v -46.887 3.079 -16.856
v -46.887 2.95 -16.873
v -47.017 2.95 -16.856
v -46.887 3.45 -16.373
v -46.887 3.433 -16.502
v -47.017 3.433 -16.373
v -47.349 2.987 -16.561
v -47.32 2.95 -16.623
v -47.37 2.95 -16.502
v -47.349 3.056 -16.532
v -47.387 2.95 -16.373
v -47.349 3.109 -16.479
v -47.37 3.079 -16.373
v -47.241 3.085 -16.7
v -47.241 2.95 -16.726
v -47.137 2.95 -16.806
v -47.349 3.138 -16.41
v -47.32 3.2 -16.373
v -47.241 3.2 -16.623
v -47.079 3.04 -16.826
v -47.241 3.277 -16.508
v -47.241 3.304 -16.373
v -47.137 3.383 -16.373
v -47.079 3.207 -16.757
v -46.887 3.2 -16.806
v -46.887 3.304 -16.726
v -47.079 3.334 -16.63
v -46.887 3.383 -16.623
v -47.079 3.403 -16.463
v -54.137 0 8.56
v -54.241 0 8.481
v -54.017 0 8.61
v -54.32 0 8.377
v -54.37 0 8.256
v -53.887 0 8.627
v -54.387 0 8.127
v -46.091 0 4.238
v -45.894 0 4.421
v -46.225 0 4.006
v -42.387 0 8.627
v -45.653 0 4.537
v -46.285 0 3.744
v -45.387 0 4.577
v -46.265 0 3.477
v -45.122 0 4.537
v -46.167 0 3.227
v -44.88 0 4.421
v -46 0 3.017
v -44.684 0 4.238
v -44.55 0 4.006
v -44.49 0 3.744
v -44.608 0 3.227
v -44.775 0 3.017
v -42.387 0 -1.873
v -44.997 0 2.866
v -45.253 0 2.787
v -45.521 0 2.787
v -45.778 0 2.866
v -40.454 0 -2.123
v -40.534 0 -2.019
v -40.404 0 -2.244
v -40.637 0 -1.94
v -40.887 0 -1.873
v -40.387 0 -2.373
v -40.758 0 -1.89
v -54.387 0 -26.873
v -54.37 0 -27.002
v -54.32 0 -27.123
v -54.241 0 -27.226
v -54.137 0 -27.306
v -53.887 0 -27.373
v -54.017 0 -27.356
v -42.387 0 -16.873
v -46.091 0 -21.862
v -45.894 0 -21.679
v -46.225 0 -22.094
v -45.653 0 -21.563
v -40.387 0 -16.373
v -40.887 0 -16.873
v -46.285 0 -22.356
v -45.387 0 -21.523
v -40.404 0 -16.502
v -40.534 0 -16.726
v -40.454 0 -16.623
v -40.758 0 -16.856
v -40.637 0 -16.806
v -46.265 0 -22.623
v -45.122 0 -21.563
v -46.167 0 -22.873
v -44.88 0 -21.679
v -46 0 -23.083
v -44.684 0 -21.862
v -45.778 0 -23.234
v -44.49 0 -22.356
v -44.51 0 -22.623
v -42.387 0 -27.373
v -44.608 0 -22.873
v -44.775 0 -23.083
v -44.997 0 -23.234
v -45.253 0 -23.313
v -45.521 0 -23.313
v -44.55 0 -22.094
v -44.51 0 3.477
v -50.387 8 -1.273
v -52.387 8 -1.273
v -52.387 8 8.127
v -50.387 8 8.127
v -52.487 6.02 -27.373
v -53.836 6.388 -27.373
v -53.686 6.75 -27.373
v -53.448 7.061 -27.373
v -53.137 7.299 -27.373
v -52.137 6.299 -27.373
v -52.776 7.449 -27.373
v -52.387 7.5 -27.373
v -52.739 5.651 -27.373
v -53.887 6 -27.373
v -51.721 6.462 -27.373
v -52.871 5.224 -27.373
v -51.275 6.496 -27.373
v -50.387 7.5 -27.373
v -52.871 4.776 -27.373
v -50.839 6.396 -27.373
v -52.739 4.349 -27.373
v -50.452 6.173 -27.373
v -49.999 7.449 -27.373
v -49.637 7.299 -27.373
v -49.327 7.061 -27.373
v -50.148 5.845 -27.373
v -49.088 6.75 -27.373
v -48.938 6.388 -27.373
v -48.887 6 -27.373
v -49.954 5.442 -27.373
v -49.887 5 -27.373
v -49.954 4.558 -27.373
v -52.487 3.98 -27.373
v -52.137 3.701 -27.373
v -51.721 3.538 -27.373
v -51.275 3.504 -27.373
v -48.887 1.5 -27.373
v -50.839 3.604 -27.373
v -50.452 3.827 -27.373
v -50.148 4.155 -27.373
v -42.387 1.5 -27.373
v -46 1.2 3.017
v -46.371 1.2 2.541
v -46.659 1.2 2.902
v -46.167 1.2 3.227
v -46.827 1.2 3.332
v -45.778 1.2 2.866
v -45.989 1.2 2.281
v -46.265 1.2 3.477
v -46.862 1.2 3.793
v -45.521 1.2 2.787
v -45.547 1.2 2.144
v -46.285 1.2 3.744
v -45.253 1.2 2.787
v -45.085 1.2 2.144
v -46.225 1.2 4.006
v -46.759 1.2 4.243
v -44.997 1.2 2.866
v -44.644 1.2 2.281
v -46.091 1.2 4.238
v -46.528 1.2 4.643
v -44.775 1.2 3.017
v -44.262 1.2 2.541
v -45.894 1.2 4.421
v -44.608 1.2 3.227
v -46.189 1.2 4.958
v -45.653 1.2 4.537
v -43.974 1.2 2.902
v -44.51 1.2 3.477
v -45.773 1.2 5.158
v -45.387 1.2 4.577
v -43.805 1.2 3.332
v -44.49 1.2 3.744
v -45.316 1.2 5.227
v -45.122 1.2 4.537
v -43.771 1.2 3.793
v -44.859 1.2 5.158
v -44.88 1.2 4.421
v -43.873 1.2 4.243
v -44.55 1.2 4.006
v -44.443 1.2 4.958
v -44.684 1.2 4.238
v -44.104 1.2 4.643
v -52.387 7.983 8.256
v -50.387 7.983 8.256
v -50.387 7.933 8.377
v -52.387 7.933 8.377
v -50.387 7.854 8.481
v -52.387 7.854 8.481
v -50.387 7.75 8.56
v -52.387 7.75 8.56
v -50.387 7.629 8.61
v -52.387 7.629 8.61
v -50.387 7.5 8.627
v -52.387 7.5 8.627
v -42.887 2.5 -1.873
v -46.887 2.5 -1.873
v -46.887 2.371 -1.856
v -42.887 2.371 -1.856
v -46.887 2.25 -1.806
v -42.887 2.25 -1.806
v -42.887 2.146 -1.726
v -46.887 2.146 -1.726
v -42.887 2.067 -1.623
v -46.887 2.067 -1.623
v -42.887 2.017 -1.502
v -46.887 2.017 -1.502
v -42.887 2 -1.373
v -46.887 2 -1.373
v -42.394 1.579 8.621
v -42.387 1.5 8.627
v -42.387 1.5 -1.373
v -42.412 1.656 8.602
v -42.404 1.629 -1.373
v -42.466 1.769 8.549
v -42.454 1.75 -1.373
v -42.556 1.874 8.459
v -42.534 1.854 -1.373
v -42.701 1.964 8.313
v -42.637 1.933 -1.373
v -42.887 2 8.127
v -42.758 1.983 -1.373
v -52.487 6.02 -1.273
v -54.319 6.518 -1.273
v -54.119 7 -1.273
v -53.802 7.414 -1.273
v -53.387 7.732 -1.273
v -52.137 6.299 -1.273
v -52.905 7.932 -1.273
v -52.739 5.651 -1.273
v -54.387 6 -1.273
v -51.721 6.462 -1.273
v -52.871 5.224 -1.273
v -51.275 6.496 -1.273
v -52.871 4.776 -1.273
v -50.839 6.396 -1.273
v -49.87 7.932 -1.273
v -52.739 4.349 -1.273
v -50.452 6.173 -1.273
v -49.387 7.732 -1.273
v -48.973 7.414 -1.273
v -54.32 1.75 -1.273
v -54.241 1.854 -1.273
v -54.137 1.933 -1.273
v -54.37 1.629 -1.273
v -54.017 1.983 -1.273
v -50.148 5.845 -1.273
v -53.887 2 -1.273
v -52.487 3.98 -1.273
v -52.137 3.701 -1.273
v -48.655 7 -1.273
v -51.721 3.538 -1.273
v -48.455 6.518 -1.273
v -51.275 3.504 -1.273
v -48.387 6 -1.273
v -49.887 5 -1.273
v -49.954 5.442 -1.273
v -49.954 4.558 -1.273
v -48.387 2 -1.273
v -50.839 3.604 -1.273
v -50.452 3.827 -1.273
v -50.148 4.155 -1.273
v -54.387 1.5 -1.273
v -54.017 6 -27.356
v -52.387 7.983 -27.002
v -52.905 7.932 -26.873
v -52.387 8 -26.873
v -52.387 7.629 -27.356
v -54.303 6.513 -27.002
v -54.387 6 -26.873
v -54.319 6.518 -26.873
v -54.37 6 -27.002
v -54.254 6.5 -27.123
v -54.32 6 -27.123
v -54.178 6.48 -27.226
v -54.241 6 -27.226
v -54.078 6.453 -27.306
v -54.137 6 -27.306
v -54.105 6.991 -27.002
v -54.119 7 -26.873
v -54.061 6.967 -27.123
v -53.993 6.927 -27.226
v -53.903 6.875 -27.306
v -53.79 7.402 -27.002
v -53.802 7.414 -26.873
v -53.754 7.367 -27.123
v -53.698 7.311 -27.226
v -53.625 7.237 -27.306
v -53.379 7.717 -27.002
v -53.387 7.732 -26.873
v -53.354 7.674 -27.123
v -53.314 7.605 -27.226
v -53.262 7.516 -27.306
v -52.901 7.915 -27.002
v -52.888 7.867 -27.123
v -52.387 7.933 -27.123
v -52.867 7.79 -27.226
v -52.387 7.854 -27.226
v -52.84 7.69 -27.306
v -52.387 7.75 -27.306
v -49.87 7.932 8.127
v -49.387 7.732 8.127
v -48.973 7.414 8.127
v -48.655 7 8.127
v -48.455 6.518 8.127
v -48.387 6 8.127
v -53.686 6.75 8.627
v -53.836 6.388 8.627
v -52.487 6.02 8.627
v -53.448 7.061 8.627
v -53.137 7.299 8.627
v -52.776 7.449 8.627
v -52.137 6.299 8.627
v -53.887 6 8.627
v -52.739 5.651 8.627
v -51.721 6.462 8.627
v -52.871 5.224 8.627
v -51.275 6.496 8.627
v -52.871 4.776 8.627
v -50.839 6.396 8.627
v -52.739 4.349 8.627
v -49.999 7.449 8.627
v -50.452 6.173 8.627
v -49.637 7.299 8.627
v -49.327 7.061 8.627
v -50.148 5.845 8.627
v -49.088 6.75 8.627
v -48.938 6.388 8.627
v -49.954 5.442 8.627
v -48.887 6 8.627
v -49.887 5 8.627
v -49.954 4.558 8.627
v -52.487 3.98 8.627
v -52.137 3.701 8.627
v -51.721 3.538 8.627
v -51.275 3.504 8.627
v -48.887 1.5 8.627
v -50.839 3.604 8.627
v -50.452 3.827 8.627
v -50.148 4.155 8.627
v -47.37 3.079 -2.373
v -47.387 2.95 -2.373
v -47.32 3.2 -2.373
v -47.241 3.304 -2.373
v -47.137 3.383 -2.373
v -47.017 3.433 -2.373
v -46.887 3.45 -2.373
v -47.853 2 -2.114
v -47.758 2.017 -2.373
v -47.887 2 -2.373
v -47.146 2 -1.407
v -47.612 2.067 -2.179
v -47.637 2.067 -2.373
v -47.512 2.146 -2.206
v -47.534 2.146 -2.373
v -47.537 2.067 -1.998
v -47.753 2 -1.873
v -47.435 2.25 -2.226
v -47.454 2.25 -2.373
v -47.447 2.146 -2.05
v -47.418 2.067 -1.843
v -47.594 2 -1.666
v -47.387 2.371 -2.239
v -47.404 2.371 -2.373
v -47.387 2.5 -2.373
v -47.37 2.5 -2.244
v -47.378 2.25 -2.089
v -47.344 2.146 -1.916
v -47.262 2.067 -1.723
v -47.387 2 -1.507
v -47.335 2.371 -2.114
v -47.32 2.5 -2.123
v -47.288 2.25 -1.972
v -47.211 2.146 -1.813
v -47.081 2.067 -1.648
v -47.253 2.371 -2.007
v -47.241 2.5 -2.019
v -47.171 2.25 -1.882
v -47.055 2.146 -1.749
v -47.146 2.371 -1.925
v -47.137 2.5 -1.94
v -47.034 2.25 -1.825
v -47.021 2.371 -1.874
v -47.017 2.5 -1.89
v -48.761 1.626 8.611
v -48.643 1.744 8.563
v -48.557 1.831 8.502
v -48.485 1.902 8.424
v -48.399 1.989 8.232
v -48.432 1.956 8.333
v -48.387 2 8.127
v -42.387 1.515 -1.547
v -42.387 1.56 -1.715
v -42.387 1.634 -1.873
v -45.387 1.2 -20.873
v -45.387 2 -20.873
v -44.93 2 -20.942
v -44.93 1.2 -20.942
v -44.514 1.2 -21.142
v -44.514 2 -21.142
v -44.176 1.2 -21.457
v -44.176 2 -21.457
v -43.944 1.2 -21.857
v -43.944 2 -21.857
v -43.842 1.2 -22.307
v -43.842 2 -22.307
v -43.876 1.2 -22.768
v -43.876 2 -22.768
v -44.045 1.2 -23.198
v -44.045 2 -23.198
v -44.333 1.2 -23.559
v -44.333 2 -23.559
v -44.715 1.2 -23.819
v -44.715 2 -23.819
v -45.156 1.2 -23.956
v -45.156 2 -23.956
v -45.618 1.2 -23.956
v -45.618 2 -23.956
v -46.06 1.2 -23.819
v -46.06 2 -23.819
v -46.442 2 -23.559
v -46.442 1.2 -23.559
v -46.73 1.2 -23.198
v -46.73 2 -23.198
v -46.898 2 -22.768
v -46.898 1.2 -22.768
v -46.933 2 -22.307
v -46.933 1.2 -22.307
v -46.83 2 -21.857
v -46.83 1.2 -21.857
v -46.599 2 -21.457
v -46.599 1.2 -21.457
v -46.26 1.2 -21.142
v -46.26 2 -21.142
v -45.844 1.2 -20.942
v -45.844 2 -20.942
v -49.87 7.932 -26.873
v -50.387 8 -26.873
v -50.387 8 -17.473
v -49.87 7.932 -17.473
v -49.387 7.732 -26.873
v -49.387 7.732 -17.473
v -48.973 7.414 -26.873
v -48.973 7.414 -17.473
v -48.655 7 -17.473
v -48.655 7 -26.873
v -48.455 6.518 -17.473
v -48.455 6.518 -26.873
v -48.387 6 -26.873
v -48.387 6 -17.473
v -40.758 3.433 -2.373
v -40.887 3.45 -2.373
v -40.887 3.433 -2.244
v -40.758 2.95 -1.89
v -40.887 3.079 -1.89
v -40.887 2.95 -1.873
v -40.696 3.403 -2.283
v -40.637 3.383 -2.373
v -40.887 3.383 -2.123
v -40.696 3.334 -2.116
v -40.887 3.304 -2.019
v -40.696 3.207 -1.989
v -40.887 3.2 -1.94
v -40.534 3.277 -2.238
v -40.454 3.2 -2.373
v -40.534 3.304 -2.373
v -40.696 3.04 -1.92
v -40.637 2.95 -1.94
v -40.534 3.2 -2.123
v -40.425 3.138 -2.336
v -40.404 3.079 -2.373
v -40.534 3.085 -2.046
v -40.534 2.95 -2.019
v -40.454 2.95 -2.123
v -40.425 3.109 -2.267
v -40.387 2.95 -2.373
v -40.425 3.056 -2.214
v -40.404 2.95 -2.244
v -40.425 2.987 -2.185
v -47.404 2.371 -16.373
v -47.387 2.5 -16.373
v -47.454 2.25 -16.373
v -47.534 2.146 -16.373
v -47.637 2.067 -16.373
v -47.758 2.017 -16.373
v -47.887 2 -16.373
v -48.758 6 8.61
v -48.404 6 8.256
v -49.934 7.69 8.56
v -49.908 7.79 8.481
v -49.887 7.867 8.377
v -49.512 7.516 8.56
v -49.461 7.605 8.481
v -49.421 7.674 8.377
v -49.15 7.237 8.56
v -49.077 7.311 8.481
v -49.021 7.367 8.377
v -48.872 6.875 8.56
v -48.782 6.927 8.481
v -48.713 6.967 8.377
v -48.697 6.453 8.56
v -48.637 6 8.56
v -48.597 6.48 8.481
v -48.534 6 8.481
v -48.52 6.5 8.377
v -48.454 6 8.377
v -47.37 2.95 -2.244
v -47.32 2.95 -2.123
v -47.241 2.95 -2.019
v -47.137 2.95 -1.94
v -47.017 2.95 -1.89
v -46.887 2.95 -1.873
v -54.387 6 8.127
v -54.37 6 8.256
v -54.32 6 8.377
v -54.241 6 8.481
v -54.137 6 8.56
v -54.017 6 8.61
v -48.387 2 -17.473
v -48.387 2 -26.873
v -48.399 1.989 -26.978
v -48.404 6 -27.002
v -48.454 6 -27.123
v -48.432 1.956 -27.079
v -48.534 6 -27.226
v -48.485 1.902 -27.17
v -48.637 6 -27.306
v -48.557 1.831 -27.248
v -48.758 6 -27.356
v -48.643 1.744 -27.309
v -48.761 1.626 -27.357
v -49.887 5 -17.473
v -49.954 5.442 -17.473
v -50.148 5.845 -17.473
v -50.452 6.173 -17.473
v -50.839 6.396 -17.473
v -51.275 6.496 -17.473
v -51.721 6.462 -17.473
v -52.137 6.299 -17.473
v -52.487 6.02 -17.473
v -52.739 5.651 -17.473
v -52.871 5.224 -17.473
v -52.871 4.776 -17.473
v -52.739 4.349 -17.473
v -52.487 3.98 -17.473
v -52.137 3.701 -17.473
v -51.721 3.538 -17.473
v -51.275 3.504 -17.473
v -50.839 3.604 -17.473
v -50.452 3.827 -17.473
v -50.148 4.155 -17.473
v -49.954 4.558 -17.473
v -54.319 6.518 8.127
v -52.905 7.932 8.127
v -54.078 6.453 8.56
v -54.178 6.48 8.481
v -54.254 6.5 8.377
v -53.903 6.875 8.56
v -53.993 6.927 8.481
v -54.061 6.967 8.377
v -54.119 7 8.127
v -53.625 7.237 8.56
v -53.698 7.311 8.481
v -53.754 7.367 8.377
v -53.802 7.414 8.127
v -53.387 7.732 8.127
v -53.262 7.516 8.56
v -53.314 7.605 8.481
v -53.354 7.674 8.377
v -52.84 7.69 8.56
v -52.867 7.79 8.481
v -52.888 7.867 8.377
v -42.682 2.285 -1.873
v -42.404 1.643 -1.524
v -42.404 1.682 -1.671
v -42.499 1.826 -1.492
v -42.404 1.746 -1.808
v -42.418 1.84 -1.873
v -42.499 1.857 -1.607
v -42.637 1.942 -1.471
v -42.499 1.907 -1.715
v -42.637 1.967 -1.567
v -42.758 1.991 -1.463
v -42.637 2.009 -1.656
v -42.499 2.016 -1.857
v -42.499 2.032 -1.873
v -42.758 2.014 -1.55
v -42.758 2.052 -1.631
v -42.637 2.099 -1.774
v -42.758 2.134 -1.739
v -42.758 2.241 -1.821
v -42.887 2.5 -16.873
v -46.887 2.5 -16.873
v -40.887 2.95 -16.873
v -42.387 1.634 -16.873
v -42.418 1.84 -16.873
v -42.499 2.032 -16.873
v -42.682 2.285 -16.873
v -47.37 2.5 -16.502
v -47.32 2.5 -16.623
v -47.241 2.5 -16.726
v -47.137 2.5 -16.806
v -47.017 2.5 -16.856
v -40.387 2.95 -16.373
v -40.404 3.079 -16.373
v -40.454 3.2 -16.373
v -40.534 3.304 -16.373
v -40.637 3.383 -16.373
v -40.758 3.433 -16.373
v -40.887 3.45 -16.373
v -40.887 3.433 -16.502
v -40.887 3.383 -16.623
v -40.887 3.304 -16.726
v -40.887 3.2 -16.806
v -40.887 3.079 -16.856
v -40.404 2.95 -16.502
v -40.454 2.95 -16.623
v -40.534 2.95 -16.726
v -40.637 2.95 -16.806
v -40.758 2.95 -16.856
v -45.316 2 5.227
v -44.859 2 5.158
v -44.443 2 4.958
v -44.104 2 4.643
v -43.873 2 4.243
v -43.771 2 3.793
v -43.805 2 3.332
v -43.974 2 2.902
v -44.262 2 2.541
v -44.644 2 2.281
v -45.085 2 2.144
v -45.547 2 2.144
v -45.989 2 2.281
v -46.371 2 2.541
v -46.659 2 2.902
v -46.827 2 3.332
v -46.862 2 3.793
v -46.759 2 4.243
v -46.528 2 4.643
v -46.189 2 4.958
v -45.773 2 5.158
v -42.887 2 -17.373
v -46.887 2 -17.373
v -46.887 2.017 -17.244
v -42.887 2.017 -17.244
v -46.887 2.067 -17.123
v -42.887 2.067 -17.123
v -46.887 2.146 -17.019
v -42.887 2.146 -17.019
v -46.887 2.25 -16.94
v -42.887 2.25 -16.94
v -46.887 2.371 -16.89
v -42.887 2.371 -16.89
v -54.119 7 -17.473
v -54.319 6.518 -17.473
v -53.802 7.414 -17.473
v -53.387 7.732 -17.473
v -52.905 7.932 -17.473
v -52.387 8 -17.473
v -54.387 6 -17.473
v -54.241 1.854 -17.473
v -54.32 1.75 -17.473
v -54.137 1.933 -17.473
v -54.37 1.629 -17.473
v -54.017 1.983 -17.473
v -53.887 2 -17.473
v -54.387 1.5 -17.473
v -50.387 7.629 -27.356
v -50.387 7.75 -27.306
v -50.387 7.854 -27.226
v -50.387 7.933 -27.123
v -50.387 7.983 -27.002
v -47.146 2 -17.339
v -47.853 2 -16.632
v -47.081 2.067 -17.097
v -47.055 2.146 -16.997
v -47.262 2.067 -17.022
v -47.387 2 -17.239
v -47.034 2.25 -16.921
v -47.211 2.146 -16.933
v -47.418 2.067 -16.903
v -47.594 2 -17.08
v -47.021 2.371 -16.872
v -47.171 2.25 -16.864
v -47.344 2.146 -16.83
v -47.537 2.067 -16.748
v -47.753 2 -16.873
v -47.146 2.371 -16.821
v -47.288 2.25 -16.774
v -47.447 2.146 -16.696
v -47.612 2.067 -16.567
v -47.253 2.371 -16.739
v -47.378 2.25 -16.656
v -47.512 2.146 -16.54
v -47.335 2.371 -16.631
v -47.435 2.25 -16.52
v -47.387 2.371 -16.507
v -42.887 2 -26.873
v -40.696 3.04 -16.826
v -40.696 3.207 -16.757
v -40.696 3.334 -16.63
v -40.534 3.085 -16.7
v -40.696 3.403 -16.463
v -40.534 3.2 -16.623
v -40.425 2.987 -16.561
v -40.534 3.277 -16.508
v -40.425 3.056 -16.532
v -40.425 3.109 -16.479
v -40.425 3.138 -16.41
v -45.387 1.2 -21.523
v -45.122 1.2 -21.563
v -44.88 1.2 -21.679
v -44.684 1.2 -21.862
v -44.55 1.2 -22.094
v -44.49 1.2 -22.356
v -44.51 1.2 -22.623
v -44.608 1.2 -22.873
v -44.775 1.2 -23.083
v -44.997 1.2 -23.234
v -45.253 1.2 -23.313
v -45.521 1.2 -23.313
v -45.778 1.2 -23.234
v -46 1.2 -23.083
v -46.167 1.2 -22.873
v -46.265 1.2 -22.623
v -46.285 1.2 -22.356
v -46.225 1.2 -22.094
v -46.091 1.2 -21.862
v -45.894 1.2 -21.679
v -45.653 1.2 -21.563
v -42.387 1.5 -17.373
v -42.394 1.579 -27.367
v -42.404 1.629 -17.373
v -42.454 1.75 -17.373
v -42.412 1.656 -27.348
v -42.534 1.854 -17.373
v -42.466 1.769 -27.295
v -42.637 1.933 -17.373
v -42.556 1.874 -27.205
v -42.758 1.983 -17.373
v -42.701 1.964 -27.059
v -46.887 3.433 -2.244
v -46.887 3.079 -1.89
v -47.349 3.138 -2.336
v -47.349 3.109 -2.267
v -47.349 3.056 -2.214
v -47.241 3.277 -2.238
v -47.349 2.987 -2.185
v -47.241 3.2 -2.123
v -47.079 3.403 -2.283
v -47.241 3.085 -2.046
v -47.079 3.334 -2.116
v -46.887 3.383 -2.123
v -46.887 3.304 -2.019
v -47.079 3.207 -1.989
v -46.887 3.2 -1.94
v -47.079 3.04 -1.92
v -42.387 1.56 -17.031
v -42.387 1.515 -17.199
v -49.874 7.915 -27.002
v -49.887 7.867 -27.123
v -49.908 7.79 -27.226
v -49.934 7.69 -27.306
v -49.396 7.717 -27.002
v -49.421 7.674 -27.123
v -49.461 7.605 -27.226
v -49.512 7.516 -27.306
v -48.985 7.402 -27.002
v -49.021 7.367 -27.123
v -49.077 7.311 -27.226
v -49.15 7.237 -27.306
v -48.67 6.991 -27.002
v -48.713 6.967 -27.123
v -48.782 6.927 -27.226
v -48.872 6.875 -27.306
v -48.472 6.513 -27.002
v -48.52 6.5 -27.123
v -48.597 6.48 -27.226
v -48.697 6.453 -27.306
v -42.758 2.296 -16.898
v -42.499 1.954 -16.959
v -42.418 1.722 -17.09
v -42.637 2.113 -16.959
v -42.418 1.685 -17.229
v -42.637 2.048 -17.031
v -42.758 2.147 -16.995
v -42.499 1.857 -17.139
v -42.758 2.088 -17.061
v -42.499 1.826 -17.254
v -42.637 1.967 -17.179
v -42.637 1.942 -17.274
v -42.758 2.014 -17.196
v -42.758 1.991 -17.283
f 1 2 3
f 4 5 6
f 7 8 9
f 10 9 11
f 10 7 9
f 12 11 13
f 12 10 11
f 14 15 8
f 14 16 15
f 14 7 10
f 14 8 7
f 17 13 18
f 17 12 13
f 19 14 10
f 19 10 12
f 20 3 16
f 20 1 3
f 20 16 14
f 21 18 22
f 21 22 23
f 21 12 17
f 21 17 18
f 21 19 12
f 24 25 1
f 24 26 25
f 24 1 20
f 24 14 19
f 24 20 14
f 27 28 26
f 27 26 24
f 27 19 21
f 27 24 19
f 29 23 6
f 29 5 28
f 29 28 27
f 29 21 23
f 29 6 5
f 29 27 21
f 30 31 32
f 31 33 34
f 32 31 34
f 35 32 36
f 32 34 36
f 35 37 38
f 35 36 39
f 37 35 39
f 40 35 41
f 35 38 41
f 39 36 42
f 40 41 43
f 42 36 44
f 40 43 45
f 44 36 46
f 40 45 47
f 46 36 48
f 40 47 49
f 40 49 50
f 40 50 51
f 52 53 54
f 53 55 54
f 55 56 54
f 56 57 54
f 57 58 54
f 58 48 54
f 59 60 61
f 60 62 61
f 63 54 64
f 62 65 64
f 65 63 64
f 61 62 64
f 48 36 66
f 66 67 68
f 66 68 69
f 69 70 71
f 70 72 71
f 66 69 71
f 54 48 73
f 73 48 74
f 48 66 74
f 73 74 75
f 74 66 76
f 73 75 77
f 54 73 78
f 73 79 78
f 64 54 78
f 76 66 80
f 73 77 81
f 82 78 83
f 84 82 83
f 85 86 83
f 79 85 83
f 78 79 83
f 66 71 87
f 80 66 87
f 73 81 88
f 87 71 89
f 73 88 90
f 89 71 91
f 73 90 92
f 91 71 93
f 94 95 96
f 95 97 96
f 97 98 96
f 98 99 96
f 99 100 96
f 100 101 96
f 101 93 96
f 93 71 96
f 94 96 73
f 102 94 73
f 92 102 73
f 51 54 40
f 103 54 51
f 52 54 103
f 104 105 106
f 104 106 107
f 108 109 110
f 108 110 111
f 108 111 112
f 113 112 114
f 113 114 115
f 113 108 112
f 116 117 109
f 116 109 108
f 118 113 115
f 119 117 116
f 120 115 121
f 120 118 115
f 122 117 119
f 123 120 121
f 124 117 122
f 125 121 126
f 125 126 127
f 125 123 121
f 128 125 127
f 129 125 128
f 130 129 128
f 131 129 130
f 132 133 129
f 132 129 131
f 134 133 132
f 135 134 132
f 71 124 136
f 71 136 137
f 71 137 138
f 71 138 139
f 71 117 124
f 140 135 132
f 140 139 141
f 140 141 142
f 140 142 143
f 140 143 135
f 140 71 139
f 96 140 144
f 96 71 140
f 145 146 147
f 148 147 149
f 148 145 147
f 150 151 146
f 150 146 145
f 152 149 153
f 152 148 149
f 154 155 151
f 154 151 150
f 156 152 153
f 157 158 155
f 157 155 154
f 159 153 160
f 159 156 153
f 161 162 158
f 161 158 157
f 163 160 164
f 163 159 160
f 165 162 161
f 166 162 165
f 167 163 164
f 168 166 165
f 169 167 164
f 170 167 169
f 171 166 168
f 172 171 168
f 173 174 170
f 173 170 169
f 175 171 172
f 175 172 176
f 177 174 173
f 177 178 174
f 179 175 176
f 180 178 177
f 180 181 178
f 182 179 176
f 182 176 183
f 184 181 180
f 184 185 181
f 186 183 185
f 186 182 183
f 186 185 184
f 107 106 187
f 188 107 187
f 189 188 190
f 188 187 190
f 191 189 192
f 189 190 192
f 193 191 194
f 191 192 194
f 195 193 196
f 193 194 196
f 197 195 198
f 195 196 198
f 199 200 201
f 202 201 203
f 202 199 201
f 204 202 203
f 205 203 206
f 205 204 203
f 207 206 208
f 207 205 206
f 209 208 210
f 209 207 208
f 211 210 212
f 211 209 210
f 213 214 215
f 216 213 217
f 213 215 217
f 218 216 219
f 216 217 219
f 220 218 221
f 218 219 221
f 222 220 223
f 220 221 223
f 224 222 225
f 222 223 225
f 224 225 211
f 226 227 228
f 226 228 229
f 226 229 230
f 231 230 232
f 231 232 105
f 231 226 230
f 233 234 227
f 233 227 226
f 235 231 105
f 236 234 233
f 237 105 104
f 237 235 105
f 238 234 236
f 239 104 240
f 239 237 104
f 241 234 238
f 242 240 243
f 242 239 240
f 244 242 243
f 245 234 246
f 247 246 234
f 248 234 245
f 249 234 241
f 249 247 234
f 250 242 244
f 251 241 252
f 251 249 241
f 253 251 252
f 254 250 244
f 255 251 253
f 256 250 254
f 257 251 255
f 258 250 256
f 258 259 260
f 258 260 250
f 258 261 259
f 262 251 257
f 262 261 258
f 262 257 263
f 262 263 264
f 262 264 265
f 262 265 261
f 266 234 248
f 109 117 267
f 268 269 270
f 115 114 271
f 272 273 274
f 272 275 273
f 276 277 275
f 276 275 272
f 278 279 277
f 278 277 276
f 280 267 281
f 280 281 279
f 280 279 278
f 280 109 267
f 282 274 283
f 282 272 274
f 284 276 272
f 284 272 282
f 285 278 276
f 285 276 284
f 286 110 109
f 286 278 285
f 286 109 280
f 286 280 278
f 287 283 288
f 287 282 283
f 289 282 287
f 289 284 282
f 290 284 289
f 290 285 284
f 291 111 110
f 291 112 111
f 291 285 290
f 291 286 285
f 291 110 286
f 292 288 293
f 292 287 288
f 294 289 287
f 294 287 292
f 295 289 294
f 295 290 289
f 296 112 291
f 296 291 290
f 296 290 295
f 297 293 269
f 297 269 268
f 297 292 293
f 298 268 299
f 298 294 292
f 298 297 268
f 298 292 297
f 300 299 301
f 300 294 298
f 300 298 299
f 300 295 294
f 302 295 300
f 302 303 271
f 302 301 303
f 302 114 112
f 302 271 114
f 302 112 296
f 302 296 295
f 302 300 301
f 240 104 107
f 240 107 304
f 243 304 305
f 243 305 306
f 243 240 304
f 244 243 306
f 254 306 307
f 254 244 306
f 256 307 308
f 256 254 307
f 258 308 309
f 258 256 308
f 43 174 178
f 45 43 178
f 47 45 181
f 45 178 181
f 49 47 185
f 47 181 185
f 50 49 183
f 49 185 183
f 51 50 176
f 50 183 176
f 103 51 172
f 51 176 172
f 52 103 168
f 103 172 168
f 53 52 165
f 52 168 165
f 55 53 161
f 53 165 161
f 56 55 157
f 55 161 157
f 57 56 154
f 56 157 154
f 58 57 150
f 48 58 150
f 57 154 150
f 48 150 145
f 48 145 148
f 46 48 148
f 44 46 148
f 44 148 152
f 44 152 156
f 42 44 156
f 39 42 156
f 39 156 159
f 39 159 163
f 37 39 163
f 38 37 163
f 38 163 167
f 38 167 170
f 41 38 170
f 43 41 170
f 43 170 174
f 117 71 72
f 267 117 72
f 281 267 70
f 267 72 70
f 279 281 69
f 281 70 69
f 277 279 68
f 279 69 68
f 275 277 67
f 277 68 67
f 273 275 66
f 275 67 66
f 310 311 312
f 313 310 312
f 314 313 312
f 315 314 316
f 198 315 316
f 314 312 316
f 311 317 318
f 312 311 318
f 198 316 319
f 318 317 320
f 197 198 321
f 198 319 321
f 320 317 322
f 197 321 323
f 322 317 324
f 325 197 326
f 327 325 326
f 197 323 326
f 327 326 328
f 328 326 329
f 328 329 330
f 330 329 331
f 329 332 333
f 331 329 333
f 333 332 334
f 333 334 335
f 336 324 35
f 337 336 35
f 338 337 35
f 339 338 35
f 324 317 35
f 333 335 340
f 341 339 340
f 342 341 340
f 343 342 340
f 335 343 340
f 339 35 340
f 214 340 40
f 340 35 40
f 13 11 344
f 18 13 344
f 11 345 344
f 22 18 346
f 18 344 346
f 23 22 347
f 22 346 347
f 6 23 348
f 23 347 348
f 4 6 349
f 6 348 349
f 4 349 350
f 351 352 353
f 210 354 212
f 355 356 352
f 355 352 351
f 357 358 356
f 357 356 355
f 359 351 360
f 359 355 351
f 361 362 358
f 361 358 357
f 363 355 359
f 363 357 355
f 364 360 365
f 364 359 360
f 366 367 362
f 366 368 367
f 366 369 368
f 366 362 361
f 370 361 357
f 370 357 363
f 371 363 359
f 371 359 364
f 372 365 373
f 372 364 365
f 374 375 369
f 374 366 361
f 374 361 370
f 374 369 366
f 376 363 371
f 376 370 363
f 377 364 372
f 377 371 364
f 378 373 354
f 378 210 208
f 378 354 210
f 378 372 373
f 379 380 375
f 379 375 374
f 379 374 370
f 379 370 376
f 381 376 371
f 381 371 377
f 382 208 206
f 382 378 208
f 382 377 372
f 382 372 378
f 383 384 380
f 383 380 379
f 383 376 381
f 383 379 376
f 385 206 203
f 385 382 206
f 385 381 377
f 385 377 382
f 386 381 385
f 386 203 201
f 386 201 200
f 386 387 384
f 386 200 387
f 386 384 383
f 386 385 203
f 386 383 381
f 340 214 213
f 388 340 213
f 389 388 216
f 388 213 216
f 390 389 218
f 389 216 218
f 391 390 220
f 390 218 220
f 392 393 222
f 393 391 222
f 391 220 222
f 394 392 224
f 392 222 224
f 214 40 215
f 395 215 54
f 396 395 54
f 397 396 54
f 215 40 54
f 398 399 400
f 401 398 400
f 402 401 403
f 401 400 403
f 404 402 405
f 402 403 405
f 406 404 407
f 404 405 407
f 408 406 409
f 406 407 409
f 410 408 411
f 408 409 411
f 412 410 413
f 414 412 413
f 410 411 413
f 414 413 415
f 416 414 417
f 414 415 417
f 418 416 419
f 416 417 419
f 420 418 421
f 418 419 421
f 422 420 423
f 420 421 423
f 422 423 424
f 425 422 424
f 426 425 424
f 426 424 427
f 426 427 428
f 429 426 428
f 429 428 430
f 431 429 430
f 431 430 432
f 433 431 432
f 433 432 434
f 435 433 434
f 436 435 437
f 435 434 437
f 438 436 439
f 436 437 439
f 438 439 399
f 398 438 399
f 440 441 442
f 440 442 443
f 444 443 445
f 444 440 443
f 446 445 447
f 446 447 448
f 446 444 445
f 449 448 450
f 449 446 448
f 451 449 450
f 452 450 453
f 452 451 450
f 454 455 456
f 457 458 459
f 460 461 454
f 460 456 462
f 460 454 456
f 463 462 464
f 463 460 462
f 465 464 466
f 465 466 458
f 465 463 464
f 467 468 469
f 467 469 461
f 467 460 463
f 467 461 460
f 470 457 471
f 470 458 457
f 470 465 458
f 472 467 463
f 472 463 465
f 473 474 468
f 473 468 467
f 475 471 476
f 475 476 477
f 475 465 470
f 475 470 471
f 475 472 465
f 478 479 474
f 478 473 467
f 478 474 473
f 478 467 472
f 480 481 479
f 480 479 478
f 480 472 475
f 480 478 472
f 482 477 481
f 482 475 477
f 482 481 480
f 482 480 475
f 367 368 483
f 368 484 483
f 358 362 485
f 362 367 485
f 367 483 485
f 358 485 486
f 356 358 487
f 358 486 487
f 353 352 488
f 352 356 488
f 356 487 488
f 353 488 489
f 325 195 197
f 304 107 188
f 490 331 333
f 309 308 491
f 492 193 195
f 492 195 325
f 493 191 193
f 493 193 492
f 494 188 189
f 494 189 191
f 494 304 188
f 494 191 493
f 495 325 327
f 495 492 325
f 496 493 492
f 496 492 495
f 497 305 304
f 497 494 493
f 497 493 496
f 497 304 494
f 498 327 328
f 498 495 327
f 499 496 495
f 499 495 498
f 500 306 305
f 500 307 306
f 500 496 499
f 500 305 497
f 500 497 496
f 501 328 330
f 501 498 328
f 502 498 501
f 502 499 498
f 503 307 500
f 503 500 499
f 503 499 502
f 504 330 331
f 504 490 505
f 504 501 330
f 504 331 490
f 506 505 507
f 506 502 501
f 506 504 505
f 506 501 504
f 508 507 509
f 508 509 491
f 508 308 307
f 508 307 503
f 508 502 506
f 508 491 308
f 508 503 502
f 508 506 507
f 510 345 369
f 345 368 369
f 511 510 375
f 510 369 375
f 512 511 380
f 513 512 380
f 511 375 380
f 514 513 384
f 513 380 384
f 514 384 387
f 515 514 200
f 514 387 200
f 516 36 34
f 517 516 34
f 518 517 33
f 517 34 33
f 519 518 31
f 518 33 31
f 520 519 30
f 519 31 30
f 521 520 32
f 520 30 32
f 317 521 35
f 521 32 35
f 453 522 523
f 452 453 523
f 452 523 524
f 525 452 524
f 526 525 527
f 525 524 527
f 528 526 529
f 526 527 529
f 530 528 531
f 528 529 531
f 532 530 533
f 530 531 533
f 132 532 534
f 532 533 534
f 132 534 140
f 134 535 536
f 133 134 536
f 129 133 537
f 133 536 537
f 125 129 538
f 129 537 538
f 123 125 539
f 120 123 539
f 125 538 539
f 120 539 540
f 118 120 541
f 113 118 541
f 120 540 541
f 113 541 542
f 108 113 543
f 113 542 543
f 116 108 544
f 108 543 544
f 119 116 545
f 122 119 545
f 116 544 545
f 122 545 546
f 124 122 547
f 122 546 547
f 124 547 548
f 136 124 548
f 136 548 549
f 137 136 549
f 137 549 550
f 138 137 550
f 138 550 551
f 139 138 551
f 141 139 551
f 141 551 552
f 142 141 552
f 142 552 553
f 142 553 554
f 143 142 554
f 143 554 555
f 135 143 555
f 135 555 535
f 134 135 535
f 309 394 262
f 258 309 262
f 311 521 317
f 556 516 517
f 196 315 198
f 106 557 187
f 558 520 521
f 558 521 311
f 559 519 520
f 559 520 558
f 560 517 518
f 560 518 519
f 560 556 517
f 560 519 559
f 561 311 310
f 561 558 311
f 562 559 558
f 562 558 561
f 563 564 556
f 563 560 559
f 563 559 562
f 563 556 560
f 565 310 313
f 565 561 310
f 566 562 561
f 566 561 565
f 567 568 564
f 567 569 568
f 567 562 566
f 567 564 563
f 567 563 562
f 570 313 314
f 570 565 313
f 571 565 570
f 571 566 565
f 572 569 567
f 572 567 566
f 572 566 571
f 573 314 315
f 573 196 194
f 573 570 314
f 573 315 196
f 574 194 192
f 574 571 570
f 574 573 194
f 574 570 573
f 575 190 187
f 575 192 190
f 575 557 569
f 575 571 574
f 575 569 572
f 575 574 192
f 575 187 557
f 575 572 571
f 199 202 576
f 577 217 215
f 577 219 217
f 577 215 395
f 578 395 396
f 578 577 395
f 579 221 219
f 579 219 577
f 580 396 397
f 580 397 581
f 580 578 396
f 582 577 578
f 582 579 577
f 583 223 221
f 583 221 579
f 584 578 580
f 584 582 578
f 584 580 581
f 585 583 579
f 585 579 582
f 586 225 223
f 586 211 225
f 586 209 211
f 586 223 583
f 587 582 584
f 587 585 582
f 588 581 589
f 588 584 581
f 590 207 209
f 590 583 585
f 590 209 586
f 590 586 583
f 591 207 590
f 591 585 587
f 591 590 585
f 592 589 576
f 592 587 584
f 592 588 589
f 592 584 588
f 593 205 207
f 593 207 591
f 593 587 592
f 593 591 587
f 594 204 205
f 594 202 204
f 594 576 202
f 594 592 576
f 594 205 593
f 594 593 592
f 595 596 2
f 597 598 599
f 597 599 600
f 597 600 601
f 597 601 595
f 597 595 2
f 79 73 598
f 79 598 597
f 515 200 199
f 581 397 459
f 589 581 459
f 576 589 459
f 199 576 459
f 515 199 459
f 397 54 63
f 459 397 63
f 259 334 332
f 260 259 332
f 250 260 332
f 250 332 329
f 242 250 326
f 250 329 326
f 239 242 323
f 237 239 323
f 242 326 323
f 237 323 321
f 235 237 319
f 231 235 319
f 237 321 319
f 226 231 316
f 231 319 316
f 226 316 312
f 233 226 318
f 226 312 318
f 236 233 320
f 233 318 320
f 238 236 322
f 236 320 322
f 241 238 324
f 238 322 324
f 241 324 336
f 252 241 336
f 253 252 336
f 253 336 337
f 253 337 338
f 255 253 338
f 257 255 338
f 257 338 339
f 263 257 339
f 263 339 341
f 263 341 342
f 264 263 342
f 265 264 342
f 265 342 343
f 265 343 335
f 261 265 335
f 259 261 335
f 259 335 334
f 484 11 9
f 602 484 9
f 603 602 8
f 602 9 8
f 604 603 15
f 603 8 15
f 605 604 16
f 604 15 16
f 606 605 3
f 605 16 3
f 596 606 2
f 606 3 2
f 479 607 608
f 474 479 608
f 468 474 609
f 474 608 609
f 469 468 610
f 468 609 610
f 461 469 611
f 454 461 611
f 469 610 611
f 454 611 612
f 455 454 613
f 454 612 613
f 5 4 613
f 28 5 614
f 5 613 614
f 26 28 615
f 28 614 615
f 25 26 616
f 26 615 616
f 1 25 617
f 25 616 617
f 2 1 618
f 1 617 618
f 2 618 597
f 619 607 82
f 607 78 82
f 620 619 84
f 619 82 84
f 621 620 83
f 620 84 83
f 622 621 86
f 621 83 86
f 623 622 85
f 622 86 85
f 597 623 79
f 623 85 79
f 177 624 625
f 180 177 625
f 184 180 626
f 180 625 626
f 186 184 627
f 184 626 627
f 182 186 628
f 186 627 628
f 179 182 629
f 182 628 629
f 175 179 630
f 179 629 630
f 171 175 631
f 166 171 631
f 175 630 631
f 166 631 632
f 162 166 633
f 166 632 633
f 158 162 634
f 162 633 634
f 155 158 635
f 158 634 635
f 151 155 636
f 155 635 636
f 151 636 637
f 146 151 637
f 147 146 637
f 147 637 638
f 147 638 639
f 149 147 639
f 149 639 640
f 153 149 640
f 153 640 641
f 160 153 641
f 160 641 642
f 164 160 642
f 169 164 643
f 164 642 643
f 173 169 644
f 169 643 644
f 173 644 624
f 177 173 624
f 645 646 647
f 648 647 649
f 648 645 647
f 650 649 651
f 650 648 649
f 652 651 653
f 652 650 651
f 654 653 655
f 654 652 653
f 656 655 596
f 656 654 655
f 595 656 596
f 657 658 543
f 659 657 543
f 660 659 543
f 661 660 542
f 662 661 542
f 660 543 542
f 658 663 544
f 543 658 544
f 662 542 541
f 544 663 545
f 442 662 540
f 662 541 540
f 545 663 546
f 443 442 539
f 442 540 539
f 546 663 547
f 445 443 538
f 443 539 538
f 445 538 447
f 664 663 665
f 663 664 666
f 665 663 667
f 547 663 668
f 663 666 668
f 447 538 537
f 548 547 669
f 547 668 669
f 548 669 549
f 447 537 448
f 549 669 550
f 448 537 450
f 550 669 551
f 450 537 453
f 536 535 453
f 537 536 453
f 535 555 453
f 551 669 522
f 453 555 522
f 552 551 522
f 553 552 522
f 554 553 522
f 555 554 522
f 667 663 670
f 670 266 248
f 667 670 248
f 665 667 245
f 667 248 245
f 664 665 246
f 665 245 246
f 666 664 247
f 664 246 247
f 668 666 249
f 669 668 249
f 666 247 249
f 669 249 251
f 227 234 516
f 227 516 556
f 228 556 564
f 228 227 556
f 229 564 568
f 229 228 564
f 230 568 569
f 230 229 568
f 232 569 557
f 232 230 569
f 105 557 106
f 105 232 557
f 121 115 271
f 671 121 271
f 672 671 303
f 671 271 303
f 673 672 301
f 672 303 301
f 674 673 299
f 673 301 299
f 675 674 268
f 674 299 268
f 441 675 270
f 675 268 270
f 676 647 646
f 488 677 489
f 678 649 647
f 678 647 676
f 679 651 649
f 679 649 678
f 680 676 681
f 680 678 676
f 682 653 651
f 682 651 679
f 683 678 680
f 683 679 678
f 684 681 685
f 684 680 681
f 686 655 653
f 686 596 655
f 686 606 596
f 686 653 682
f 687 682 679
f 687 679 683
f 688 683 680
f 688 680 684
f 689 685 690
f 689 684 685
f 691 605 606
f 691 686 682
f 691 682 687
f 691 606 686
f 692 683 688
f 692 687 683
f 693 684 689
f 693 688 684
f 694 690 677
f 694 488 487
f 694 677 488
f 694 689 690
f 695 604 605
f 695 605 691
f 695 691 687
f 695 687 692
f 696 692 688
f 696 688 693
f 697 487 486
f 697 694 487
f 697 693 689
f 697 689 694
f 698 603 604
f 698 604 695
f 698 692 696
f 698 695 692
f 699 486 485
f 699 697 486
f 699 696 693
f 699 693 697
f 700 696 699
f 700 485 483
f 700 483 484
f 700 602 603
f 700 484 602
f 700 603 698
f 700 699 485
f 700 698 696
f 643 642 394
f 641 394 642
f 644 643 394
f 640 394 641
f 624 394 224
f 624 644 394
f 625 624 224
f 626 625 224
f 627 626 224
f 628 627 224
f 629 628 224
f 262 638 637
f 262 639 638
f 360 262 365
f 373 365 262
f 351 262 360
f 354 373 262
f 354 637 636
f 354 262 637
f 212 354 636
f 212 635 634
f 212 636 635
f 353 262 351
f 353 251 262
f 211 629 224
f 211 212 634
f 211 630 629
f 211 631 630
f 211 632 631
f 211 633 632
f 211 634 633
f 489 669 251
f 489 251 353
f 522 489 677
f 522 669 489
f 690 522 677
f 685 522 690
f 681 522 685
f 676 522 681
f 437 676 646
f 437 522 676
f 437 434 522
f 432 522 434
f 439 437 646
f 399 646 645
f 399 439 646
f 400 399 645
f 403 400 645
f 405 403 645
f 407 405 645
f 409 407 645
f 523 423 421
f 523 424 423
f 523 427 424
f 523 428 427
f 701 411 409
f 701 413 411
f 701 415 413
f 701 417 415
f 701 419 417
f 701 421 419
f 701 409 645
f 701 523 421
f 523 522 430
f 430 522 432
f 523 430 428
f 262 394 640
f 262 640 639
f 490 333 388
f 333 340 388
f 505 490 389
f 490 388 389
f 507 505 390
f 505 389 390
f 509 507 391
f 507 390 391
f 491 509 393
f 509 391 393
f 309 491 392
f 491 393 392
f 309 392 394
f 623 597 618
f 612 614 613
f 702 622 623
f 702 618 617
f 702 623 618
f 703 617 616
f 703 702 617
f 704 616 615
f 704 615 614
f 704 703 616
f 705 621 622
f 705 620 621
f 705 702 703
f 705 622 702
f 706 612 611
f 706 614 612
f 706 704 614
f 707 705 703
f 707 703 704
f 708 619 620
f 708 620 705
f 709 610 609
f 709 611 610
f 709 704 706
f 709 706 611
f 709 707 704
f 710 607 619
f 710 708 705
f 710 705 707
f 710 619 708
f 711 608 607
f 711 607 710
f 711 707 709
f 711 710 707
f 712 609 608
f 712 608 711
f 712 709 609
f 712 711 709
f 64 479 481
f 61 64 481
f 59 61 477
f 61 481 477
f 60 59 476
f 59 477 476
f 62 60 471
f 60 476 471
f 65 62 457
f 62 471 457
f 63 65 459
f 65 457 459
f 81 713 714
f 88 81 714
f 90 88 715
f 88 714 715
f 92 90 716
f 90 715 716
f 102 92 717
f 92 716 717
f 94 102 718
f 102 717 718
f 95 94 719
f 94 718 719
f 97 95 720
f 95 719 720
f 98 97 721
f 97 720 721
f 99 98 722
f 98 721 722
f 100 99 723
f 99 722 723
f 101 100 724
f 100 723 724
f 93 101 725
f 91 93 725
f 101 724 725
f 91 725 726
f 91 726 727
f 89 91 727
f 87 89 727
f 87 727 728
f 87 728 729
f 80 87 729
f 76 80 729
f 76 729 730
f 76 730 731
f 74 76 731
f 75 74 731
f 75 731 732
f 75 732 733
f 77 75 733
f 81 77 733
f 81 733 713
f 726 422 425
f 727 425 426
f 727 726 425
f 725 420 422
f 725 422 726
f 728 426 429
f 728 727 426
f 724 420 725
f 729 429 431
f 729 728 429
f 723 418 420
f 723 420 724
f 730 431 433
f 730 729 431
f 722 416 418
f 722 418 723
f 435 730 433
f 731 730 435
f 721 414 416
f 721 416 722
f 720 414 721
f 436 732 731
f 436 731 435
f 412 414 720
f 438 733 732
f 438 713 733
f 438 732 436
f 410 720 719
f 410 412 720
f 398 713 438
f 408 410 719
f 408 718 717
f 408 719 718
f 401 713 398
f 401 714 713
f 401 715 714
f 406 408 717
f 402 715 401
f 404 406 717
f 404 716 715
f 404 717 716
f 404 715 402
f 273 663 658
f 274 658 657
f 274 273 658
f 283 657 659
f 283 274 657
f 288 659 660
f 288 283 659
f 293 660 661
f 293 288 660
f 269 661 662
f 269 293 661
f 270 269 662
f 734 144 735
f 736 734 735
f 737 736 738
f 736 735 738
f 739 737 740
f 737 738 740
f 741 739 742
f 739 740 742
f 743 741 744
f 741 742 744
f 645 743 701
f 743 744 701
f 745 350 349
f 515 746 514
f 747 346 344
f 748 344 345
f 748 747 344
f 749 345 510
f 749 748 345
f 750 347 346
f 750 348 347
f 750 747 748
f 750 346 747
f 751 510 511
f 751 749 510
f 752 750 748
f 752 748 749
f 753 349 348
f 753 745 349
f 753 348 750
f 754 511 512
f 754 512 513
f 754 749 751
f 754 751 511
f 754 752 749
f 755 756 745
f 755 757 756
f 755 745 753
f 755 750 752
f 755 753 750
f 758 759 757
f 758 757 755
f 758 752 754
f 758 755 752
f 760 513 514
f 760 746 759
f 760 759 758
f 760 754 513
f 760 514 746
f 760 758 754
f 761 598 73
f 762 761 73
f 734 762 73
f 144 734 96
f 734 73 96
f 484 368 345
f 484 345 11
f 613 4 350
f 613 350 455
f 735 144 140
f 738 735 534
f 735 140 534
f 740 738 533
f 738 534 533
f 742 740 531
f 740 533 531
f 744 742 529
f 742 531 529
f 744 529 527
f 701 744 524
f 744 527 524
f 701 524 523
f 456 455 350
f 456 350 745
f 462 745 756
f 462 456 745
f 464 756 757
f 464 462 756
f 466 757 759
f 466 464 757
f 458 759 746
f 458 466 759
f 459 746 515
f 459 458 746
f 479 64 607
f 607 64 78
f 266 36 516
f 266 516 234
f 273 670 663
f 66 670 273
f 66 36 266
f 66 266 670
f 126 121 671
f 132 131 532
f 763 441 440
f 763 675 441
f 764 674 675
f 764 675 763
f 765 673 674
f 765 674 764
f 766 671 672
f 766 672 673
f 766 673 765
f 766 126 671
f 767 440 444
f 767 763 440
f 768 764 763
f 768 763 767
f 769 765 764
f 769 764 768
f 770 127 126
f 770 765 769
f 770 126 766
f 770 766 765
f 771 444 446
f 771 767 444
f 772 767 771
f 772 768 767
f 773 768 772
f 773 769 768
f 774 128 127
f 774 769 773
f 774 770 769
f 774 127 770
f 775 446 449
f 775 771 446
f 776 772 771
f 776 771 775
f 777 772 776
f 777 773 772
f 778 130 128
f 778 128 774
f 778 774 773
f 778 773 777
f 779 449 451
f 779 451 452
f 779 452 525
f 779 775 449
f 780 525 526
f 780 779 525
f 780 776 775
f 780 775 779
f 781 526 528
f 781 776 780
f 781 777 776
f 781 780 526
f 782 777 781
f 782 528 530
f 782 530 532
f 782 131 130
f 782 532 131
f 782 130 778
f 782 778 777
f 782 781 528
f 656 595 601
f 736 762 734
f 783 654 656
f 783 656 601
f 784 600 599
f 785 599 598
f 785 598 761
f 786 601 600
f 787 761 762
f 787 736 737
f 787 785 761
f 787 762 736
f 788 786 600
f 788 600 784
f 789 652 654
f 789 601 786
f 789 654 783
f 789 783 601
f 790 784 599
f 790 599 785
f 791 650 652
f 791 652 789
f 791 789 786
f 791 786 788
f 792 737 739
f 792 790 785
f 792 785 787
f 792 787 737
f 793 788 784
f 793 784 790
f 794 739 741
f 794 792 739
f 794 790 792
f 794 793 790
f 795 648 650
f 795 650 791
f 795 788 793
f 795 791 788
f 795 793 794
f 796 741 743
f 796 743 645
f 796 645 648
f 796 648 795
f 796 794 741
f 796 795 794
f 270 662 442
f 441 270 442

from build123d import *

# Parameters (mm, degrees)
SKETCH2_W             = 12
SKETCH2_H             = 36
BOSS_EXTRUDE1_DEPTH   = 2
SKETCH3_W             = 6
SKETCH3_H             = 9.9
BOSS_EXTRUDE2_DEPTH   = 6
F_3_0MM_DOWEL_HOLE1_D = 3
FILLET1_R             = 2
SKETCH10_W            = 15
SKETCH10_H            = 2
BOSS_EXTRUDE3_DEPTH   = 2
SKETCH11_W            = 7
SKETCH11_H            = 15
BOSS_EXTRUDE4_DEPTH   = 1.45
FILLET2_R             = 0.5
FILLET5_R             = 0.5
FILLET6_R             = 0.5
SKETCH7_R             = 0.9
CUT_EXTRUDE5_DEPTH    = 62.182196999
SKETCH19_R            = 1.55
CUT_EXTRUDE6_DEPTH    = 0.8
FILLET7_R             = 0.5


with BuildPart() as part:
    # Sketch2 → Boss-Extrude1 (new body)
    with BuildSketch(Plane(origin=(0, 0, 0), x_dir=(1, 0, 0), z_dir=(0, 1, 0))):
        with Locations((-48.387350108, 9.372931481)):
            Rectangle(SKETCH2_W, SKETCH2_H)
    extrude(amount=BOSS_EXTRUDE1_DEPTH)

    # Sketch3 → Boss-Extrude2 (add)
    with BuildSketch(Plane(origin=(0, 2, 0), x_dir=(1, 0, 0), z_dir=(0, 1, 0))):
        with Locations((-51.387350108, -3.677068519)):
            Rectangle(SKETCH3_W, SKETCH3_H)
        with Locations((-51.387350108, 22.422931481)):
            Rectangle(SKETCH3_W, SKETCH3_H)
    extrude(amount=BOSS_EXTRUDE2_DEPTH)

    # Ø3.0mm Dowel Hole1 (through all)
    with Locations(Plane(origin=(0, 0, -27.372931481), x_dir=(-1, 0, 0), z_dir=(0, 0, -1))):
        with Locations((51.387350108, 5)):
            Hole(F_3_0MM_DOWEL_HOLE1_D / 2)

    # Fillet1
    fillet1_edges = [part.edges().sort_by_distance(p)[0] for p in [
        (-54.387350108, 8, 3.677068519),
        (-48.387350108, 8, 3.677068519),
        (-54.387350108, 8, -22.422931481),
        (-48.387350108, 8, -22.422931481),
    ]]
    fillet(fillet1_edges, radius=FILLET1_R)

    # Sketch10 → Boss-Extrude3 (add)
    with BuildSketch(Plane(origin=(-42.387350108, 0, 0), x_dir=(0, 0, -1), z_dir=(1, 0, 0))):
        with Locations((9.372931481, 1)):
            Rectangle(SKETCH10_W, SKETCH10_H)
    extrude(amount=BOSS_EXTRUDE3_DEPTH)

    # Sketch11 → Boss-Extrude4 (add)
    with BuildSketch(Plane(origin=(0, 2, 0), x_dir=(1, 0, 0), z_dir=(0, 1, 0))):
        with Locations((-43.887350108, 9.372931481)):
            Rectangle(SKETCH11_W, SKETCH11_H)
    extrude(amount=BOSS_EXTRUDE4_DEPTH)

    # Fillet2
    fillet2_edges = [part.edges().sort_by_distance(p)[0] for p in [
        (-40.387350108, 1.725, -1.872931481),
        (-40.387350108, 1.725, -16.872931481),
        (-43.887350108, 3.45, -16.872931481),
        (-43.887350108, 3.45, -1.872931481),
    ]]
    fillet(fillet2_edges, radius=FILLET2_R)

    # Fillet5
    # the kernel refuses this fillet: 0.5 mm, written as the material it takes off along each edge
    with BuildSketch(Plane(origin=(-40.887350108, 2.95, -16.372931481), x_dir=(0, 1, 0), z_dir=(1, 0, 0))) as fillet5_piece_1_section:
        Polygon((0, 0), (FILLET5_R, 0), (FILLET5_R, -FILLET5_R), (0, -FILLET5_R), align=None)
    fillet5_piece_1 = extrude(amount=FILLET5_R, mode=Mode.PRIVATE)
    fillet5_piece_1 = fillet5_piece_1 - Plane(origin=(-40.887350108, 2.95, -16.372931481), x_dir=(0, -0.7071067811865475, 0.7071067811865475), z_dir=(1, 0, 0)) * Sphere(FILLET5_R, mode=Mode.PRIVATE)
    add(fillet5_piece_1, mode=Mode.SUBTRACT)
    with BuildSketch(Plane(origin=(-40.887350108, 2.95, -2.372931481), x_dir=(0, 1, 0), z_dir=(1, 0, 0))) as fillet5_piece_2_section:
        Polygon((0, 0), (FILLET5_R, 0), (FILLET5_R, FILLET5_R), (0, FILLET5_R), align=None)
    fillet5_piece_2 = extrude(amount=FILLET5_R, mode=Mode.PRIVATE)
    fillet5_piece_2 = fillet5_piece_2 - Plane(origin=(-40.887350108, 2.95, -2.372931481), x_dir=(0, -0.7071067811865477, -0.7071067811865474), z_dir=(1, 0, 0)) * Sphere(FILLET5_R, mode=Mode.PRIVATE)
    add(fillet5_piece_2, mode=Mode.SUBTRACT)
    with BuildSketch(Plane(origin=(-40.387350108, 3.45, -16.372931481), x_dir=(0, -1, 0), z_dir=(0, 0, 1))) as fillet5_piece_3:
        with BuildLine():
            CenterArc((FILLET5_R, -FILLET5_R), FILLET5_R, 90, 90)
            Line((0, -FILLET5_R), (0, 0))
            Line((0, 0), (FILLET5_R, 0))
        make_face()
    extrude(amount=14, mode=Mode.SUBTRACT)

    # Fillet6
    fillet6_edges = [part.edges().sort_by_distance(p)[0] for p in [
        (-47.387350108, 2.475, -16.872931481),
        (-47.387350108, 2.475, -1.872931481),
        (-47.387350108, 3.45, -9.372931481),
        (-47.387350108, 3.303553391, -2.01937809),
        (-47.387350108, 3.303553391, -16.726484871),
        (-44.887350108, 2, -16.872931481),
        (-47.387350108, 2, -9.372931481),
        (-44.887350108, 2, -1.872931481),
    ]]
    fillet(fillet6_edges, radius=FILLET6_R)

    # Sketch7 → Cut-Extrude5 (cut, through all)
    with BuildSketch(Plane(origin=(0, 2, 0), x_dir=(1, 0, 0), z_dir=(0, 1, 0))):
        with Locations(Location((-45.387350108, -3.677068519, 0), (0, 0, 270))):
            Circle(SKETCH7_R)
        with Locations(Location((-45.387350108, 22.422931481, 0), (0, 0, 270))):
            Circle(SKETCH7_R)
    extrude(amount=-CUT_EXTRUDE5_DEPTH, mode=Mode.SUBTRACT)

    # Sketch19 → Cut-Extrude6 (cut)
    with BuildSketch(Plane(origin=(0, 2, 0), x_dir=(1, 0, 0), z_dir=(0, 1, 0))):
        with Locations(Location((-45.316328349, -3.677068519, 0), (0, 0, 270))):
            Circle(SKETCH19_R)
        with Locations(Location((-45.387350108, 22.422931481, 0), (0, 0, 270))):
            Circle(SKETCH19_R)
    extrude(amount=-CUT_EXTRUDE6_DEPTH, mode=Mode.SUBTRACT)

    # Fillet7
    # the kernel refuses this fillet: 0.5 mm, written as the material it takes off along each edge
    with BuildSketch(Plane(origin=(-42.387350108, 2, -1.372931481), x_dir=(0, -1, 0), z_dir=(0, 0, 1)), Plane(origin=(-42.387350108, 2, -28.622931481), x_dir=(0, -1, 0), z_dir=(0, 0, 1))) as fillet7_piece_1:
        with BuildLine():
            CenterArc((FILLET7_R, -FILLET7_R), FILLET7_R, 90, 90)
            Line((0, -FILLET7_R), (0, 0))
            Line((0, 0), (FILLET7_R, 0))
        make_face()
    extrude(amount=11.25, mode=Mode.SUBTRACT)
    with BuildSketch(Plane(origin=(-41.137350108, 2, 8.627068519), x_dir=(0, -1, 0), z_dir=(-1, 0, 0)), Plane(origin=(-48.387350108, 2, -27.372931481), x_dir=(0, -1, 0), z_dir=(1, 0, 0)), Plane(origin=(-54.387350108, -1.25, 8.627068519), x_dir=(0, 0, -1), z_dir=(0, 1, 0)), Plane(origin=(-54.387350108, -1.25, -27.372931481), x_dir=(1, 0, 0), z_dir=(0, 1, 0))) as fillet7_piece_2:
        with BuildLine():
            CenterArc((FILLET7_R, -FILLET7_R), FILLET7_R, 90, 90)
            Line((0, -FILLET7_R), (0, 0))
            Line((0, 0), (FILLET7_R, 0))
        make_face()
    extrude(amount=7.25, mode=Mode.SUBTRACT)
    with BuildSketch(Plane(origin=(-42.387350108, 2.5, -17.372931481), x_dir=(0, 0.5976672776328271, -0.8017442392976486), z_dir=(0, -0.8017442392976486, -0.5976672776328271))) as fillet7_piece_3_section:
        with BuildLine():
            CenterArc((0.5 + FILLET7_R, -FILLET7_R), FILLET7_R, 90, 90)
            Line((0.5, -FILLET7_R), (0.5, 0))
            Line((0.5, 0), (0.5 + FILLET7_R, 0))
        make_face()
    fillet7_piece_3 = revolve(axis=Axis((-42.387350108, 2.5, -17.372931481), (1, 0, 0)), revolution_arc=233.296989237, mode=Mode.PRIVATE)
    fillet7_piece_3 = split(fillet7_piece_3, bisect_by=Plane(origin=(-42.387350108, 2.5, -16.872931481), z_dir=(0, 0, -1)), keep=Keep.TOP, mode=Mode.PRIVATE)
    add(fillet7_piece_3, mode=Mode.SUBTRACT)
    with BuildSketch(Plane(origin=(-42.387350108, 2.5, -1.372931481), x_dir=(0, -1, 0), z_dir=(0, 0, 1))) as fillet7_piece_4_section:
        with BuildLine():
            CenterArc((0.5 + FILLET7_R, -FILLET7_R), FILLET7_R, 90, 90)
            Line((0.5, -FILLET7_R), (0.5, 0))
            Line((0.5, 0), (0.5 + FILLET7_R, 0))
        make_face()
    fillet7_piece_4 = revolve(axis=Axis((-42.387350108, 2.5, -1.372931481), (1, 0, 0)), revolution_arc=233.296989237, mode=Mode.PRIVATE)
    fillet7_piece_4 = split(fillet7_piece_4, bisect_by=Plane(origin=(-42.387350108, 2.5, -1.872931481), z_dir=(0, 0, 1)), keep=Keep.TOP, mode=Mode.PRIVATE)
    add(fillet7_piece_4, mode=Mode.SUBTRACT)
    with BuildSketch(Plane(origin=(-54.387350108, 2, -1.272931481), x_dir=(0, -1, 0), z_dir=(0, 0, -1))) as fillet7_piece_5:
        with BuildLine():
            CenterArc((FILLET7_R, -FILLET7_R), FILLET7_R, 90, 90)
            Line((0, -FILLET7_R), (0, 0))
            Line((0, 0), (FILLET7_R, 0))
        make_face()
    extrude(amount=16.2, mode=Mode.SUBTRACT)
    with BuildSketch(Plane(origin=(-52.387350108, 8, -27.372931481), x_dir=(0, -1, 0), z_dir=(1, 0, 0))) as fillet7_piece_6:
        with BuildLine():
            CenterArc((FILLET7_R, -FILLET7_R), FILLET7_R, 90, 90)
            Line((0, -FILLET7_R), (0, 0))
            Line((0, 0), (FILLET7_R, 0))
        make_face()
    extrude(amount=2, mode=Mode.SUBTRACT)
    with BuildSketch(Plane(origin=(-48.387350108, 2, -27.372931481), x_dir=(-1, 0, 0), z_dir=(0, 1, 0))) as fillet7_piece_7:
        with BuildLine():
            CenterArc((FILLET7_R, FILLET7_R), FILLET7_R, 180, 90)
            Line((0, FILLET7_R), (0, 0))
            Line((0, 0), (FILLET7_R, 0))
        make_face()
    extrude(amount=4, mode=Mode.SUBTRACT)
    with BuildSketch(Plane(origin=(-50.387350108, 6, -27.372931481), x_dir=(0, 1, 0), z_dir=(-1, 0, 0))) as fillet7_piece_8:
        with BuildLine():
            CenterArc((2 - FILLET7_R, -FILLET7_R), FILLET7_R, 0, 90)
            Line((2, -FILLET7_R), (2, 0))
            Line((2, 0), (2 - FILLET7_R, 0))
        make_face()
    revolve(axis=Axis((-50.387350108, 6, -27.372931481), (0, 0, -1)), revolution_arc=90, mode=Mode.SUBTRACT)
    with BuildSketch(Plane(origin=(-52.387350108, 6, -27.372931481), x_dir=(-1, 0, 0), z_dir=(0, -1, 0))) as fillet7_piece_9:
        with BuildLine():
            CenterArc((2 - FILLET7_R, -FILLET7_R), FILLET7_R, 0, 90)
            Line((2, -FILLET7_R), (2, 0))
            Line((2, 0), (2 - FILLET7_R, 0))
        make_face()
    revolve(axis=Axis((-52.387350108, 6, -27.372931481), (0, 0, -1)), revolution_arc=90, mode=Mode.SUBTRACT)
    with BuildSketch(Plane(origin=(-52.387350108, 8, 8.627068519), x_dir=(0, -1, 0), z_dir=(1, 0, 0))) as fillet7_piece_10:
        with BuildLine():
            CenterArc((FILLET7_R, FILLET7_R), FILLET7_R, 180, 90)
            Line((0, FILLET7_R), (0, 0))
            Line((0, 0), (FILLET7_R, 0))
        make_face()
    extrude(amount=2, mode=Mode.SUBTRACT)
    with BuildSketch(Plane(origin=(-48.387350108, 2, 8.627068519), x_dir=(-1, 0, 0), z_dir=(0, 1, 0))) as fillet7_piece_11:
        with BuildLine():
            CenterArc((FILLET7_R, -FILLET7_R), FILLET7_R, 90, 90)
            Line((0, -FILLET7_R), (0, 0))
            Line((0, 0), (FILLET7_R, 0))
        make_face()
    extrude(amount=4, mode=Mode.SUBTRACT)
    with BuildSketch(Plane(origin=(-50.387350108, 6, 8.627068519), x_dir=(0, 1, 0), z_dir=(-1, 0, 0))) as fillet7_piece_12:
        with BuildLine():
            CenterArc((2 - FILLET7_R, FILLET7_R), FILLET7_R, 270, 90)
            Line((2, FILLET7_R), (2, 0))
            Line((2, 0), (2 - FILLET7_R, 0))
        make_face()
    revolve(axis=Axis((-50.387350108, 6, 8.627068519), (0, 0, -1)), revolution_arc=90, mode=Mode.SUBTRACT)
    with BuildSketch(Plane(origin=(-52.387350108, 6, 8.627068519), x_dir=(-1, 0, 0), z_dir=(0, -1, 0))) as fillet7_piece_13:
        with BuildLine():
            CenterArc((2 - FILLET7_R, FILLET7_R), FILLET7_R, 270, 90)
            Line((2, FILLET7_R), (2, 0))
            Line((2, 0), (2 - FILLET7_R, 0))
        make_face()
    revolve(axis=Axis((-52.387350108, 6, 8.627068519), (0, 0, -1)), revolution_arc=90, mode=Mode.SUBTRACT)
    with BuildSketch(Plane(origin=(-42.387350108, 2, 8.627068519), x_dir=(0, -1, 0), z_dir=(-1, 0, 0))) as fillet7_piece_14a_section:
        with BuildLine():
            CenterArc((FILLET7_R, -FILLET7_R), FILLET7_R, 90, 90)
            Line((0, -FILLET7_R), (0, 0))
            Line((0, 0), (FILLET7_R, 0))
        make_face()
    fillet7_piece_14a = extrude(amount=7.25, mode=Mode.PRIVATE)
    fillet7_piece_14a = split(fillet7_piece_14a, bisect_by=Plane(origin=(-48.387350108, 2, 8.627068519), z_dir=(-1, 0, 0)), keep=Keep.TOP, mode=Mode.PRIVATE)
    with BuildSketch(Plane(origin=(-48.387350108, 0.75, 8.627068519), x_dir=(-1, 0, 0), z_dir=(0, 1, 0))) as fillet7_piece_14b_section:
        with BuildLine():
            CenterArc((FILLET7_R, -FILLET7_R), FILLET7_R, 90, 90)
            Line((0, -FILLET7_R), (0, 0))
            Line((0, 0), (FILLET7_R, 0))
        make_face()
    fillet7_piece_14b = extrude(amount=5.25, mode=Mode.PRIVATE)
    fillet7_piece_14b = split(fillet7_piece_14b, bisect_by=Plane(origin=(-48.387350108, 2, 8.627068519), z_dir=(0, -1, 0)), keep=Keep.TOP, mode=Mode.PRIVATE)
    fillet7_piece_14 = fillet7_piece_14a & fillet7_piece_14b
    add(fillet7_piece_14, mode=Mode.SUBTRACT)
    with BuildSketch(Plane(origin=(-49.637350108, 2, -27.372931481), x_dir=(0, -1, 0), z_dir=(1, 0, 0))) as fillet7_piece_15a_section:
        with BuildLine():
            CenterArc((FILLET7_R, -FILLET7_R), FILLET7_R, 90, 90)
            Line((0, -FILLET7_R), (0, 0))
            Line((0, 0), (FILLET7_R, 0))
        make_face()
    fillet7_piece_15a = extrude(amount=7.25, mode=Mode.PRIVATE)
    fillet7_piece_15a = split(fillet7_piece_15a, bisect_by=Plane(origin=(-48.387350108, 2, -27.372931481), z_dir=(-1, 0, 0)), keep=Keep.TOP, mode=Mode.PRIVATE)
    with BuildSketch(Plane(origin=(-48.387350108, 0.75, -27.372931481), x_dir=(-1, 0, 0), z_dir=(0, 1, 0))) as fillet7_piece_15b_section:
        with BuildLine():
            CenterArc((FILLET7_R, FILLET7_R), FILLET7_R, 180, 90)
            Line((0, FILLET7_R), (0, 0))
            Line((0, 0), (FILLET7_R, 0))
        make_face()
    fillet7_piece_15b = extrude(amount=5.25, mode=Mode.PRIVATE)
    fillet7_piece_15b = split(fillet7_piece_15b, bisect_by=Plane(origin=(-48.387350108, 2, -27.372931481), z_dir=(0, -1, 0)), keep=Keep.TOP, mode=Mode.PRIVATE)
    fillet7_piece_15 = fillet7_piece_15a & fillet7_piece_15b
    add(fillet7_piece_15, mode=Mode.SUBTRACT)


solid = part.part
